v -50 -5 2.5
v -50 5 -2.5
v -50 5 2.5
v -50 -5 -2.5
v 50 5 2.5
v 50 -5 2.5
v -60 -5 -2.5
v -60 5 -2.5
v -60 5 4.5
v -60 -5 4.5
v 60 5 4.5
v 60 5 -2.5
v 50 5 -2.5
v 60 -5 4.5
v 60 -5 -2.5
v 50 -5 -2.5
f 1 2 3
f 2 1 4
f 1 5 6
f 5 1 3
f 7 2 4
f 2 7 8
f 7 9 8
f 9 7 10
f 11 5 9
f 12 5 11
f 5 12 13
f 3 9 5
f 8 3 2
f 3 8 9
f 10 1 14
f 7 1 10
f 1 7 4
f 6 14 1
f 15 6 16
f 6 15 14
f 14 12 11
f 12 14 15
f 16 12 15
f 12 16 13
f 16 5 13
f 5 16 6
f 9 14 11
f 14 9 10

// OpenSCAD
delta=100;
depth=10;
width=10;
height=[5, 2];

for (i = [-1:2:1])
{
	translate([i*delta/2+i*width/2,0,0])
		cube([width,depth,height[0]], center=true);
}

translate([0,0,height[0]/2+height[1]/2])
	cube([delta+2*width,depth,height[1]], center=true);
